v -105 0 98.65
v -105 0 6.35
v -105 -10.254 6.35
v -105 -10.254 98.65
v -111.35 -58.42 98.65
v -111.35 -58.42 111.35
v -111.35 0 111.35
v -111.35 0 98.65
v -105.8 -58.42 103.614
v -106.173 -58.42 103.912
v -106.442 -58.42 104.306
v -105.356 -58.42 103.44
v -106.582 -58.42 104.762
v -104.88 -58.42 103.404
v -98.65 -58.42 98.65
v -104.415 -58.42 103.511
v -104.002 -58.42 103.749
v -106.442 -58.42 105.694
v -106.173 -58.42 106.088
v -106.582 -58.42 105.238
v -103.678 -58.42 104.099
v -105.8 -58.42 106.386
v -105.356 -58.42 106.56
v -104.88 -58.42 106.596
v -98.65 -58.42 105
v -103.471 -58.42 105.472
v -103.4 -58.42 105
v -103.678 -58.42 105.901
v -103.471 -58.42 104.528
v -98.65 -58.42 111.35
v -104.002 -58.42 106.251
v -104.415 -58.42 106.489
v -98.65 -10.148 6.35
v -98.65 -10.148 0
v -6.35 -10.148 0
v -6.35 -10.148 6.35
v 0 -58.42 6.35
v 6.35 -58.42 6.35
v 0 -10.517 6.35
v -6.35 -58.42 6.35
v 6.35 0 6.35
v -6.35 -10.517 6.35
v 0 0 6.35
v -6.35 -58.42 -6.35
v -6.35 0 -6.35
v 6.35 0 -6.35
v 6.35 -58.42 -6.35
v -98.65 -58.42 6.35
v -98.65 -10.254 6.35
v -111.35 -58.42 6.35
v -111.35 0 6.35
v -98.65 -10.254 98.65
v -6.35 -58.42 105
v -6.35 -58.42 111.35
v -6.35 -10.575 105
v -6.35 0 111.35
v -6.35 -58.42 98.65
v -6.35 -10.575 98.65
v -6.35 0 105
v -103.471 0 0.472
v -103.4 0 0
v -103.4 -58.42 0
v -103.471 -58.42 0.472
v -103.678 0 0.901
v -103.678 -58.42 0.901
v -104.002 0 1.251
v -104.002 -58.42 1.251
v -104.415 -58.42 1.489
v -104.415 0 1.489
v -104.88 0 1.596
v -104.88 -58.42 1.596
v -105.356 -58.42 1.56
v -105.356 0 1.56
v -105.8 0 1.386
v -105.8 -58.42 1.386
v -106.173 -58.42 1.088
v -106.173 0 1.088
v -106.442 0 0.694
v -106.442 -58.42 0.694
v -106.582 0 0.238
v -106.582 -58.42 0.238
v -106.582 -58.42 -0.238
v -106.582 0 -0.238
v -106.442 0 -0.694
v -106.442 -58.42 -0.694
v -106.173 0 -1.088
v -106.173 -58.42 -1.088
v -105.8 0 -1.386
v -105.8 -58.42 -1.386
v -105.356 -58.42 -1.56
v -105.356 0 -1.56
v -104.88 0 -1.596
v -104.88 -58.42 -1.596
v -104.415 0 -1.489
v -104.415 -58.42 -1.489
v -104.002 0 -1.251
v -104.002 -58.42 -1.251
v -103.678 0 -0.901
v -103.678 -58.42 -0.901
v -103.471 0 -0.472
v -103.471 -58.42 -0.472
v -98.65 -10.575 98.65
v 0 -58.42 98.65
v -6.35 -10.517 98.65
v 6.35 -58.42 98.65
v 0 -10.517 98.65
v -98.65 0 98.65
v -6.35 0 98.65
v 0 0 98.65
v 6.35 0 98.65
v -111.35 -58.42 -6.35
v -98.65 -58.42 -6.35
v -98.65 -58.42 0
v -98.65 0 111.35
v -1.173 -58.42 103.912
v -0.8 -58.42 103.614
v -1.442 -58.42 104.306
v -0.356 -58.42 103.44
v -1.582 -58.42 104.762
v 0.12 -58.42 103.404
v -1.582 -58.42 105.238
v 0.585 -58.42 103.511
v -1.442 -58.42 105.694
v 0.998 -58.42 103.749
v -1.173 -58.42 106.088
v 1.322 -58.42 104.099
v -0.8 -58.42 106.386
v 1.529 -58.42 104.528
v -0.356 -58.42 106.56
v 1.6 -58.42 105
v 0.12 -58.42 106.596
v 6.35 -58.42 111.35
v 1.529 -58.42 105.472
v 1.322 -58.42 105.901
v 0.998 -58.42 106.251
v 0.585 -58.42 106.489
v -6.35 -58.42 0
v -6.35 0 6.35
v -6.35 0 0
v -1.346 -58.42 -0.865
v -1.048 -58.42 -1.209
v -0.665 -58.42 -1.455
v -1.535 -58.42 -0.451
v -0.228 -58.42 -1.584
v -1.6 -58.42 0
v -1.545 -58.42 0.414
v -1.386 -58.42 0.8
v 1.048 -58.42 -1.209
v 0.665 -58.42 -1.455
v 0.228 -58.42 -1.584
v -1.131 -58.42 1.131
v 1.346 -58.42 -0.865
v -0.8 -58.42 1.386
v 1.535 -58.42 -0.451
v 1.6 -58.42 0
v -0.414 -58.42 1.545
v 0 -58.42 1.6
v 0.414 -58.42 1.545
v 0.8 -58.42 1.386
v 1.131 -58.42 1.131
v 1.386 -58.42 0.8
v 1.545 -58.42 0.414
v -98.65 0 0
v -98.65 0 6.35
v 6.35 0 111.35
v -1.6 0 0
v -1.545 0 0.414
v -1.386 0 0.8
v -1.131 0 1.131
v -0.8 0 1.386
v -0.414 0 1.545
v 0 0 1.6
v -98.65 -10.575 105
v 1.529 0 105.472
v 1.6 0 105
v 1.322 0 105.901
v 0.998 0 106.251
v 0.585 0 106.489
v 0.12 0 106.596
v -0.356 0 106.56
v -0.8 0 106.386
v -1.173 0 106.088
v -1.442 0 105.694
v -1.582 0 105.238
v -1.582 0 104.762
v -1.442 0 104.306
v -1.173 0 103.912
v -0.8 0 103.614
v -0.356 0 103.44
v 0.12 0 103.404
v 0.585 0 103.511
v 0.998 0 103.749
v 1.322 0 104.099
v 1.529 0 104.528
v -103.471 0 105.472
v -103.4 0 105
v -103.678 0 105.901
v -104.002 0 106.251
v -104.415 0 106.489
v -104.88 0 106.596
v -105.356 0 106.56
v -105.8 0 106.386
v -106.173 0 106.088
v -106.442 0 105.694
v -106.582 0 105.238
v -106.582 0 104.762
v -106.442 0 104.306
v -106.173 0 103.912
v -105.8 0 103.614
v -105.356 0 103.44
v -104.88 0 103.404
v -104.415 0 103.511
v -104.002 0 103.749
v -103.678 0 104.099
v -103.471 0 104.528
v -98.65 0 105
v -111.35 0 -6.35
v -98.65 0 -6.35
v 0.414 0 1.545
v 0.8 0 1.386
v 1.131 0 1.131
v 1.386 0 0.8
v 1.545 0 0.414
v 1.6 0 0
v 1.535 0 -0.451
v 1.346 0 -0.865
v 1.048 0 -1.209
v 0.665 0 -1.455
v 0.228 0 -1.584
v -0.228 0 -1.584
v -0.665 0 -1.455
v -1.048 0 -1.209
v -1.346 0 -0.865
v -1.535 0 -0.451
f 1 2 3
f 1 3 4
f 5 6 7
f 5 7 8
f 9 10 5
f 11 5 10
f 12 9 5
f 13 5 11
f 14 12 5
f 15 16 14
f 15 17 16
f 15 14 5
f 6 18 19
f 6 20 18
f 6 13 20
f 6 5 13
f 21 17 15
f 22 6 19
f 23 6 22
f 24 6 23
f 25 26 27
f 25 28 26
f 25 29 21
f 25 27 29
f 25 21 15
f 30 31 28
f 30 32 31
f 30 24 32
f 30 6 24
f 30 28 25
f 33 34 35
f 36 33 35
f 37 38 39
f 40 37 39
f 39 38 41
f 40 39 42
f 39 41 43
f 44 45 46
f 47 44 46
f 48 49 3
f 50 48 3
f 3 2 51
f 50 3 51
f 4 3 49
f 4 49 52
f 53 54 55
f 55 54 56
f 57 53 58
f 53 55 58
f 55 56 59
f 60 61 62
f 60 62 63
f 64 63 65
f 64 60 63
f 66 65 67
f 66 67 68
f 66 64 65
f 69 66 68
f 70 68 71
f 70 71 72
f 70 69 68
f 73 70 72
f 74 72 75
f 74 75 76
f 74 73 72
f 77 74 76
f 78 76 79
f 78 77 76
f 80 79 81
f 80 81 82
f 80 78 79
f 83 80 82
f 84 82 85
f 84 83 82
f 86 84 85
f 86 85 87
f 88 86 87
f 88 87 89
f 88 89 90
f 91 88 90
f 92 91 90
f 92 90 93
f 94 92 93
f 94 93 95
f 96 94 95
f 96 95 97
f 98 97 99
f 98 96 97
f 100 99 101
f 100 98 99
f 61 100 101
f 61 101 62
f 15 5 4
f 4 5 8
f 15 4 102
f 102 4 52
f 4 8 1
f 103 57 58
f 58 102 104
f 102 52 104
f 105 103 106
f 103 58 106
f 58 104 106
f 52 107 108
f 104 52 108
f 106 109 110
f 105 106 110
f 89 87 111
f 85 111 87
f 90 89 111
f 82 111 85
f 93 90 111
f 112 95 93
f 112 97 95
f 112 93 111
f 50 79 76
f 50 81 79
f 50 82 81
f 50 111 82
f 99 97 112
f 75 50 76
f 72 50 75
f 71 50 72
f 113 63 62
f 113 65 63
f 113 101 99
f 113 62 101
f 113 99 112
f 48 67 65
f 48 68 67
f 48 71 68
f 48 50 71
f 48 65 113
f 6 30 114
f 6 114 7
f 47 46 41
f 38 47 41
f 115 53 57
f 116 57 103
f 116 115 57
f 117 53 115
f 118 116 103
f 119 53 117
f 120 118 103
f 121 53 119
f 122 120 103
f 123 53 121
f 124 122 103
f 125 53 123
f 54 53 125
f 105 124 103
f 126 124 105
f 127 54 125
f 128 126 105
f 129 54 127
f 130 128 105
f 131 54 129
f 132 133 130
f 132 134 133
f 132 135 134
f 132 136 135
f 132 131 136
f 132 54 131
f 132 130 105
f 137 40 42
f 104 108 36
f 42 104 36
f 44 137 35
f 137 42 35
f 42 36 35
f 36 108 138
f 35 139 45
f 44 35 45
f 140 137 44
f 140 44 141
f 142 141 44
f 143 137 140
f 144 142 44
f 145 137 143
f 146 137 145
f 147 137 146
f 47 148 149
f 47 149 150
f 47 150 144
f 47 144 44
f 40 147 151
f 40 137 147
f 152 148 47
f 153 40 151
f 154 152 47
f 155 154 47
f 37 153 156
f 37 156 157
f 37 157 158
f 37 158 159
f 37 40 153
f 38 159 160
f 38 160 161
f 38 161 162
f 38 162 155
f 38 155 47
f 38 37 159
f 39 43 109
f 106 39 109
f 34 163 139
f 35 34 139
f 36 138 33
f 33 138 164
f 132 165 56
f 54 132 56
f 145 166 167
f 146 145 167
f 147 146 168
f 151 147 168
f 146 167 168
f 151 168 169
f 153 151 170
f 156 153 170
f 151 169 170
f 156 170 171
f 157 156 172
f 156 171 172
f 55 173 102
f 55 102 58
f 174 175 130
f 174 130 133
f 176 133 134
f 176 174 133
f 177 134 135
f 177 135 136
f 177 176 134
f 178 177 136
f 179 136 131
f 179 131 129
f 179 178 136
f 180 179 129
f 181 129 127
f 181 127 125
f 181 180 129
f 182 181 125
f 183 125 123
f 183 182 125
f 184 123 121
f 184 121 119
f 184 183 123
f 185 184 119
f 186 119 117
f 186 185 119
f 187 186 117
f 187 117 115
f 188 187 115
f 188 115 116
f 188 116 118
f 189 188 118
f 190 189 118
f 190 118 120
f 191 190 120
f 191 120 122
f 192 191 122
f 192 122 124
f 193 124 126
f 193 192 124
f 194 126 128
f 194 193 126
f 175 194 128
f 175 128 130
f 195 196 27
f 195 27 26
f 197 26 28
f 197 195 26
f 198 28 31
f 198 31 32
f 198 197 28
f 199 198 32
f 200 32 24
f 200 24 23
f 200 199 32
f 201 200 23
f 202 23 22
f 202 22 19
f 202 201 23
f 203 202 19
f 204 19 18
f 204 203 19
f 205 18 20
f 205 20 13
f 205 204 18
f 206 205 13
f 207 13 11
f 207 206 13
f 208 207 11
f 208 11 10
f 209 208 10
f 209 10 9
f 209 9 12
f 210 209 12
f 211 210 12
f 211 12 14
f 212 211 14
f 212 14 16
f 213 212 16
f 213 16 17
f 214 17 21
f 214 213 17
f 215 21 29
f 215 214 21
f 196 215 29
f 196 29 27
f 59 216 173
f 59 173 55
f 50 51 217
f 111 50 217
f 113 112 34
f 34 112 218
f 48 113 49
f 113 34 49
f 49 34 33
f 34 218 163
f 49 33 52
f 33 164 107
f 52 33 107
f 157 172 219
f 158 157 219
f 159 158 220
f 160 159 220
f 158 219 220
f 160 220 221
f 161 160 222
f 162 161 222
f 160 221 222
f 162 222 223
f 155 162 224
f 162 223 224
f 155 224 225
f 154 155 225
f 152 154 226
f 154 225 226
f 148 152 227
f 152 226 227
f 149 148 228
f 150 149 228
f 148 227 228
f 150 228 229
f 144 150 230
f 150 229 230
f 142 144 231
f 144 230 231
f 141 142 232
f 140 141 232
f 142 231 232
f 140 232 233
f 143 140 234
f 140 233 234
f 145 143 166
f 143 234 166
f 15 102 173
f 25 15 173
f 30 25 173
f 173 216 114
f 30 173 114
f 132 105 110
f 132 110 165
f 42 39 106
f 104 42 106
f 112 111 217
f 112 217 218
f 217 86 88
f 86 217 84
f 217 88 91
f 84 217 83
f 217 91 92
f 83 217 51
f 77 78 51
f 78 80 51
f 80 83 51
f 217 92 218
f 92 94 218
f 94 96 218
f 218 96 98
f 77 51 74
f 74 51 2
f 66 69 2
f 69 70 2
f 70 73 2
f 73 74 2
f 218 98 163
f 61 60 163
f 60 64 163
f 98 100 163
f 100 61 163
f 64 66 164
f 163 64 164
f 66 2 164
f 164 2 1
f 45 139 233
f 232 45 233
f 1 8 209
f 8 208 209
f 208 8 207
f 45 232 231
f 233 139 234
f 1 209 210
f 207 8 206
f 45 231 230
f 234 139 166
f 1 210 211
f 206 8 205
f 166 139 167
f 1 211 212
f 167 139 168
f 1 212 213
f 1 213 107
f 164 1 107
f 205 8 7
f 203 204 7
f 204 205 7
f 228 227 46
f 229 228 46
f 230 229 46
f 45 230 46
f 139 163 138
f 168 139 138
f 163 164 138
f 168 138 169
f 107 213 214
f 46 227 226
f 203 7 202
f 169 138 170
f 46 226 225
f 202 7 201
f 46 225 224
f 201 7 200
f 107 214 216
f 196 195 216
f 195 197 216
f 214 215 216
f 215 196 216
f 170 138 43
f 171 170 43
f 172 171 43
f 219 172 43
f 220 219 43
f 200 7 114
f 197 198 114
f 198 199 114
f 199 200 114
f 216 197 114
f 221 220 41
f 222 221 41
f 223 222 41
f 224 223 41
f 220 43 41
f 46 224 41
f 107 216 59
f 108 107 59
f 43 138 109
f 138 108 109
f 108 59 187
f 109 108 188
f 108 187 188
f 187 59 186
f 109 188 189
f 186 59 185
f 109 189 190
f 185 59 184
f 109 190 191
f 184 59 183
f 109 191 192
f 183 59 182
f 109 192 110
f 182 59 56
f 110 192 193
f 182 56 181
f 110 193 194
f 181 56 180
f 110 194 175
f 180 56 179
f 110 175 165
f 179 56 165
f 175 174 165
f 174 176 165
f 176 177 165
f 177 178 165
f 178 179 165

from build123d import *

# Parameters (mm, degrees)
F0_R     = 1.6
F0_W     = 92.3
F0_H     = 6.35
F0_W_2   = 6.35
F0_H_2   = 92.3
F1_DEPTH = 58.42
F2_W     = 48.1660993379
F2_H     = 92.3
F3_DEPTH = 25.4
F4_W     = 92.3
F4_H     = 48.2718696427
F5_DEPTH = 25.4
F6_W     = 47.9031776619
F6_H     = 92.3
F7_DEPTH = 25.4
F8_W     = 92.3
F8_H     = 47.8445788455
F9_DEPTH = 25.4


with BuildPart() as f1:
    # F0 (on Front) → F1 (new body)
    with BuildSketch(Plane.XZ):
        Polygon((-98.65, 105), (-98.65, 111.35), (-111.35, 111.35), (-111.35, 98.65), (-105, 98.65), (-98.65, 98.65), align=None)
        with Locations((-105, 105)):
            Circle(F0_R, mode=Mode.SUBTRACT)
        with Locations((-52.5, 101.825)):
            Rectangle(F0_W, F0_H)
        with Locations((-101.825, 52.5)):
            Rectangle(F0_W_2, F0_H_2)
        Polygon((-6.35, 111.35), (-6.35, 105), (-6.35, 98.65), (0, 98.65), (6.35, 98.65), (6.35, 111.35), align=None)
        with Locations((0, 105)):
            Circle(F0_R, mode=Mode.SUBTRACT)
        Polygon((-98.65, 0), (-98.65, 6.35), (-105, 6.35), (-111.35, 6.35), (-111.35, -6.35), (-98.65, -6.35), align=None)
        with Locations((-105, 0)):
            Circle(F0_R, mode=Mode.SUBTRACT)
        with Locations((-52.5, 3.175)):
            Rectangle(F0_W, F0_H)
        with Locations((-3.175, 52.5)):
            Rectangle(F0_W_2, F0_H_2)
        with BuildLine():
            Line((0, 6.35), (-6.35, 6.35))
            Line((-6.35, 6.35), (-6.35, 0))
            Line((-6.35, 0), (-1.6, 0))
            ThreePointArc((-1.6, 0), (-1.1313708499, 1.1313708499), (0, 1.6))
            Line((0, 1.6), (0, 6.35))
        make_face()
        with BuildLine():
            Line((-1.6, 0), (-6.35, 0))
            Line((-6.35, 0), (-6.35, -6.35))
            Line((-6.35, -6.35), (6.35, -6.35))
            Line((6.35, -6.35), (6.35, 6.35))
            Line((6.35, 6.35), (0, 6.35))
            Line((0, 6.35), (0, 1.6))
            ThreePointArc((0, 1.6), (1.1313708499, 1.1313708499), (1.6, 0))
            ThreePointArc((1.6, 0), (0, -1.6), (-1.6, 0))
        make_face()
    extrude(amount=F1_DEPTH)

    # F2 (on face) → F3 (cut)
    with BuildSketch(Plane(origin=(-105, 0, 0), x_dir=(0, -1, 0), z_dir=(-1, 0, 0))):
        with Locations((34.336950331, 52.5)):
            Rectangle(F2_W, F2_H)
    extrude(amount=-F3_DEPTH, mode=Mode.SUBTRACT)

    # F4 (on face) → F5 (cut)
    with BuildSketch(Plane(origin=(0, 0, 0), x_dir=(1, 0, 0), z_dir=(0, 0, -1))):
        with Locations((-52.5, 34.2840651786)):
            Rectangle(F4_W, F4_H)
    extrude(amount=-F5_DEPTH, mode=Mode.SUBTRACT)

    # F6 (on face) → F7 (cut)
    with BuildSketch(Plane.YZ):
        with Locations((-34.4684111691, 52.5)):
            Rectangle(F6_W, F6_H)
    extrude(amount=-F7_DEPTH, mode=Mode.SUBTRACT)

    # F8 (on face) → F9 (cut)
    with BuildSketch(Plane.XY.offset(105)):
        with Locations((-52.5, -34.4977105772)):
            Rectangle(F8_W, F8_H)
    extrude(amount=-F9_DEPTH, mode=Mode.SUBTRACT)


solid = f1.part
